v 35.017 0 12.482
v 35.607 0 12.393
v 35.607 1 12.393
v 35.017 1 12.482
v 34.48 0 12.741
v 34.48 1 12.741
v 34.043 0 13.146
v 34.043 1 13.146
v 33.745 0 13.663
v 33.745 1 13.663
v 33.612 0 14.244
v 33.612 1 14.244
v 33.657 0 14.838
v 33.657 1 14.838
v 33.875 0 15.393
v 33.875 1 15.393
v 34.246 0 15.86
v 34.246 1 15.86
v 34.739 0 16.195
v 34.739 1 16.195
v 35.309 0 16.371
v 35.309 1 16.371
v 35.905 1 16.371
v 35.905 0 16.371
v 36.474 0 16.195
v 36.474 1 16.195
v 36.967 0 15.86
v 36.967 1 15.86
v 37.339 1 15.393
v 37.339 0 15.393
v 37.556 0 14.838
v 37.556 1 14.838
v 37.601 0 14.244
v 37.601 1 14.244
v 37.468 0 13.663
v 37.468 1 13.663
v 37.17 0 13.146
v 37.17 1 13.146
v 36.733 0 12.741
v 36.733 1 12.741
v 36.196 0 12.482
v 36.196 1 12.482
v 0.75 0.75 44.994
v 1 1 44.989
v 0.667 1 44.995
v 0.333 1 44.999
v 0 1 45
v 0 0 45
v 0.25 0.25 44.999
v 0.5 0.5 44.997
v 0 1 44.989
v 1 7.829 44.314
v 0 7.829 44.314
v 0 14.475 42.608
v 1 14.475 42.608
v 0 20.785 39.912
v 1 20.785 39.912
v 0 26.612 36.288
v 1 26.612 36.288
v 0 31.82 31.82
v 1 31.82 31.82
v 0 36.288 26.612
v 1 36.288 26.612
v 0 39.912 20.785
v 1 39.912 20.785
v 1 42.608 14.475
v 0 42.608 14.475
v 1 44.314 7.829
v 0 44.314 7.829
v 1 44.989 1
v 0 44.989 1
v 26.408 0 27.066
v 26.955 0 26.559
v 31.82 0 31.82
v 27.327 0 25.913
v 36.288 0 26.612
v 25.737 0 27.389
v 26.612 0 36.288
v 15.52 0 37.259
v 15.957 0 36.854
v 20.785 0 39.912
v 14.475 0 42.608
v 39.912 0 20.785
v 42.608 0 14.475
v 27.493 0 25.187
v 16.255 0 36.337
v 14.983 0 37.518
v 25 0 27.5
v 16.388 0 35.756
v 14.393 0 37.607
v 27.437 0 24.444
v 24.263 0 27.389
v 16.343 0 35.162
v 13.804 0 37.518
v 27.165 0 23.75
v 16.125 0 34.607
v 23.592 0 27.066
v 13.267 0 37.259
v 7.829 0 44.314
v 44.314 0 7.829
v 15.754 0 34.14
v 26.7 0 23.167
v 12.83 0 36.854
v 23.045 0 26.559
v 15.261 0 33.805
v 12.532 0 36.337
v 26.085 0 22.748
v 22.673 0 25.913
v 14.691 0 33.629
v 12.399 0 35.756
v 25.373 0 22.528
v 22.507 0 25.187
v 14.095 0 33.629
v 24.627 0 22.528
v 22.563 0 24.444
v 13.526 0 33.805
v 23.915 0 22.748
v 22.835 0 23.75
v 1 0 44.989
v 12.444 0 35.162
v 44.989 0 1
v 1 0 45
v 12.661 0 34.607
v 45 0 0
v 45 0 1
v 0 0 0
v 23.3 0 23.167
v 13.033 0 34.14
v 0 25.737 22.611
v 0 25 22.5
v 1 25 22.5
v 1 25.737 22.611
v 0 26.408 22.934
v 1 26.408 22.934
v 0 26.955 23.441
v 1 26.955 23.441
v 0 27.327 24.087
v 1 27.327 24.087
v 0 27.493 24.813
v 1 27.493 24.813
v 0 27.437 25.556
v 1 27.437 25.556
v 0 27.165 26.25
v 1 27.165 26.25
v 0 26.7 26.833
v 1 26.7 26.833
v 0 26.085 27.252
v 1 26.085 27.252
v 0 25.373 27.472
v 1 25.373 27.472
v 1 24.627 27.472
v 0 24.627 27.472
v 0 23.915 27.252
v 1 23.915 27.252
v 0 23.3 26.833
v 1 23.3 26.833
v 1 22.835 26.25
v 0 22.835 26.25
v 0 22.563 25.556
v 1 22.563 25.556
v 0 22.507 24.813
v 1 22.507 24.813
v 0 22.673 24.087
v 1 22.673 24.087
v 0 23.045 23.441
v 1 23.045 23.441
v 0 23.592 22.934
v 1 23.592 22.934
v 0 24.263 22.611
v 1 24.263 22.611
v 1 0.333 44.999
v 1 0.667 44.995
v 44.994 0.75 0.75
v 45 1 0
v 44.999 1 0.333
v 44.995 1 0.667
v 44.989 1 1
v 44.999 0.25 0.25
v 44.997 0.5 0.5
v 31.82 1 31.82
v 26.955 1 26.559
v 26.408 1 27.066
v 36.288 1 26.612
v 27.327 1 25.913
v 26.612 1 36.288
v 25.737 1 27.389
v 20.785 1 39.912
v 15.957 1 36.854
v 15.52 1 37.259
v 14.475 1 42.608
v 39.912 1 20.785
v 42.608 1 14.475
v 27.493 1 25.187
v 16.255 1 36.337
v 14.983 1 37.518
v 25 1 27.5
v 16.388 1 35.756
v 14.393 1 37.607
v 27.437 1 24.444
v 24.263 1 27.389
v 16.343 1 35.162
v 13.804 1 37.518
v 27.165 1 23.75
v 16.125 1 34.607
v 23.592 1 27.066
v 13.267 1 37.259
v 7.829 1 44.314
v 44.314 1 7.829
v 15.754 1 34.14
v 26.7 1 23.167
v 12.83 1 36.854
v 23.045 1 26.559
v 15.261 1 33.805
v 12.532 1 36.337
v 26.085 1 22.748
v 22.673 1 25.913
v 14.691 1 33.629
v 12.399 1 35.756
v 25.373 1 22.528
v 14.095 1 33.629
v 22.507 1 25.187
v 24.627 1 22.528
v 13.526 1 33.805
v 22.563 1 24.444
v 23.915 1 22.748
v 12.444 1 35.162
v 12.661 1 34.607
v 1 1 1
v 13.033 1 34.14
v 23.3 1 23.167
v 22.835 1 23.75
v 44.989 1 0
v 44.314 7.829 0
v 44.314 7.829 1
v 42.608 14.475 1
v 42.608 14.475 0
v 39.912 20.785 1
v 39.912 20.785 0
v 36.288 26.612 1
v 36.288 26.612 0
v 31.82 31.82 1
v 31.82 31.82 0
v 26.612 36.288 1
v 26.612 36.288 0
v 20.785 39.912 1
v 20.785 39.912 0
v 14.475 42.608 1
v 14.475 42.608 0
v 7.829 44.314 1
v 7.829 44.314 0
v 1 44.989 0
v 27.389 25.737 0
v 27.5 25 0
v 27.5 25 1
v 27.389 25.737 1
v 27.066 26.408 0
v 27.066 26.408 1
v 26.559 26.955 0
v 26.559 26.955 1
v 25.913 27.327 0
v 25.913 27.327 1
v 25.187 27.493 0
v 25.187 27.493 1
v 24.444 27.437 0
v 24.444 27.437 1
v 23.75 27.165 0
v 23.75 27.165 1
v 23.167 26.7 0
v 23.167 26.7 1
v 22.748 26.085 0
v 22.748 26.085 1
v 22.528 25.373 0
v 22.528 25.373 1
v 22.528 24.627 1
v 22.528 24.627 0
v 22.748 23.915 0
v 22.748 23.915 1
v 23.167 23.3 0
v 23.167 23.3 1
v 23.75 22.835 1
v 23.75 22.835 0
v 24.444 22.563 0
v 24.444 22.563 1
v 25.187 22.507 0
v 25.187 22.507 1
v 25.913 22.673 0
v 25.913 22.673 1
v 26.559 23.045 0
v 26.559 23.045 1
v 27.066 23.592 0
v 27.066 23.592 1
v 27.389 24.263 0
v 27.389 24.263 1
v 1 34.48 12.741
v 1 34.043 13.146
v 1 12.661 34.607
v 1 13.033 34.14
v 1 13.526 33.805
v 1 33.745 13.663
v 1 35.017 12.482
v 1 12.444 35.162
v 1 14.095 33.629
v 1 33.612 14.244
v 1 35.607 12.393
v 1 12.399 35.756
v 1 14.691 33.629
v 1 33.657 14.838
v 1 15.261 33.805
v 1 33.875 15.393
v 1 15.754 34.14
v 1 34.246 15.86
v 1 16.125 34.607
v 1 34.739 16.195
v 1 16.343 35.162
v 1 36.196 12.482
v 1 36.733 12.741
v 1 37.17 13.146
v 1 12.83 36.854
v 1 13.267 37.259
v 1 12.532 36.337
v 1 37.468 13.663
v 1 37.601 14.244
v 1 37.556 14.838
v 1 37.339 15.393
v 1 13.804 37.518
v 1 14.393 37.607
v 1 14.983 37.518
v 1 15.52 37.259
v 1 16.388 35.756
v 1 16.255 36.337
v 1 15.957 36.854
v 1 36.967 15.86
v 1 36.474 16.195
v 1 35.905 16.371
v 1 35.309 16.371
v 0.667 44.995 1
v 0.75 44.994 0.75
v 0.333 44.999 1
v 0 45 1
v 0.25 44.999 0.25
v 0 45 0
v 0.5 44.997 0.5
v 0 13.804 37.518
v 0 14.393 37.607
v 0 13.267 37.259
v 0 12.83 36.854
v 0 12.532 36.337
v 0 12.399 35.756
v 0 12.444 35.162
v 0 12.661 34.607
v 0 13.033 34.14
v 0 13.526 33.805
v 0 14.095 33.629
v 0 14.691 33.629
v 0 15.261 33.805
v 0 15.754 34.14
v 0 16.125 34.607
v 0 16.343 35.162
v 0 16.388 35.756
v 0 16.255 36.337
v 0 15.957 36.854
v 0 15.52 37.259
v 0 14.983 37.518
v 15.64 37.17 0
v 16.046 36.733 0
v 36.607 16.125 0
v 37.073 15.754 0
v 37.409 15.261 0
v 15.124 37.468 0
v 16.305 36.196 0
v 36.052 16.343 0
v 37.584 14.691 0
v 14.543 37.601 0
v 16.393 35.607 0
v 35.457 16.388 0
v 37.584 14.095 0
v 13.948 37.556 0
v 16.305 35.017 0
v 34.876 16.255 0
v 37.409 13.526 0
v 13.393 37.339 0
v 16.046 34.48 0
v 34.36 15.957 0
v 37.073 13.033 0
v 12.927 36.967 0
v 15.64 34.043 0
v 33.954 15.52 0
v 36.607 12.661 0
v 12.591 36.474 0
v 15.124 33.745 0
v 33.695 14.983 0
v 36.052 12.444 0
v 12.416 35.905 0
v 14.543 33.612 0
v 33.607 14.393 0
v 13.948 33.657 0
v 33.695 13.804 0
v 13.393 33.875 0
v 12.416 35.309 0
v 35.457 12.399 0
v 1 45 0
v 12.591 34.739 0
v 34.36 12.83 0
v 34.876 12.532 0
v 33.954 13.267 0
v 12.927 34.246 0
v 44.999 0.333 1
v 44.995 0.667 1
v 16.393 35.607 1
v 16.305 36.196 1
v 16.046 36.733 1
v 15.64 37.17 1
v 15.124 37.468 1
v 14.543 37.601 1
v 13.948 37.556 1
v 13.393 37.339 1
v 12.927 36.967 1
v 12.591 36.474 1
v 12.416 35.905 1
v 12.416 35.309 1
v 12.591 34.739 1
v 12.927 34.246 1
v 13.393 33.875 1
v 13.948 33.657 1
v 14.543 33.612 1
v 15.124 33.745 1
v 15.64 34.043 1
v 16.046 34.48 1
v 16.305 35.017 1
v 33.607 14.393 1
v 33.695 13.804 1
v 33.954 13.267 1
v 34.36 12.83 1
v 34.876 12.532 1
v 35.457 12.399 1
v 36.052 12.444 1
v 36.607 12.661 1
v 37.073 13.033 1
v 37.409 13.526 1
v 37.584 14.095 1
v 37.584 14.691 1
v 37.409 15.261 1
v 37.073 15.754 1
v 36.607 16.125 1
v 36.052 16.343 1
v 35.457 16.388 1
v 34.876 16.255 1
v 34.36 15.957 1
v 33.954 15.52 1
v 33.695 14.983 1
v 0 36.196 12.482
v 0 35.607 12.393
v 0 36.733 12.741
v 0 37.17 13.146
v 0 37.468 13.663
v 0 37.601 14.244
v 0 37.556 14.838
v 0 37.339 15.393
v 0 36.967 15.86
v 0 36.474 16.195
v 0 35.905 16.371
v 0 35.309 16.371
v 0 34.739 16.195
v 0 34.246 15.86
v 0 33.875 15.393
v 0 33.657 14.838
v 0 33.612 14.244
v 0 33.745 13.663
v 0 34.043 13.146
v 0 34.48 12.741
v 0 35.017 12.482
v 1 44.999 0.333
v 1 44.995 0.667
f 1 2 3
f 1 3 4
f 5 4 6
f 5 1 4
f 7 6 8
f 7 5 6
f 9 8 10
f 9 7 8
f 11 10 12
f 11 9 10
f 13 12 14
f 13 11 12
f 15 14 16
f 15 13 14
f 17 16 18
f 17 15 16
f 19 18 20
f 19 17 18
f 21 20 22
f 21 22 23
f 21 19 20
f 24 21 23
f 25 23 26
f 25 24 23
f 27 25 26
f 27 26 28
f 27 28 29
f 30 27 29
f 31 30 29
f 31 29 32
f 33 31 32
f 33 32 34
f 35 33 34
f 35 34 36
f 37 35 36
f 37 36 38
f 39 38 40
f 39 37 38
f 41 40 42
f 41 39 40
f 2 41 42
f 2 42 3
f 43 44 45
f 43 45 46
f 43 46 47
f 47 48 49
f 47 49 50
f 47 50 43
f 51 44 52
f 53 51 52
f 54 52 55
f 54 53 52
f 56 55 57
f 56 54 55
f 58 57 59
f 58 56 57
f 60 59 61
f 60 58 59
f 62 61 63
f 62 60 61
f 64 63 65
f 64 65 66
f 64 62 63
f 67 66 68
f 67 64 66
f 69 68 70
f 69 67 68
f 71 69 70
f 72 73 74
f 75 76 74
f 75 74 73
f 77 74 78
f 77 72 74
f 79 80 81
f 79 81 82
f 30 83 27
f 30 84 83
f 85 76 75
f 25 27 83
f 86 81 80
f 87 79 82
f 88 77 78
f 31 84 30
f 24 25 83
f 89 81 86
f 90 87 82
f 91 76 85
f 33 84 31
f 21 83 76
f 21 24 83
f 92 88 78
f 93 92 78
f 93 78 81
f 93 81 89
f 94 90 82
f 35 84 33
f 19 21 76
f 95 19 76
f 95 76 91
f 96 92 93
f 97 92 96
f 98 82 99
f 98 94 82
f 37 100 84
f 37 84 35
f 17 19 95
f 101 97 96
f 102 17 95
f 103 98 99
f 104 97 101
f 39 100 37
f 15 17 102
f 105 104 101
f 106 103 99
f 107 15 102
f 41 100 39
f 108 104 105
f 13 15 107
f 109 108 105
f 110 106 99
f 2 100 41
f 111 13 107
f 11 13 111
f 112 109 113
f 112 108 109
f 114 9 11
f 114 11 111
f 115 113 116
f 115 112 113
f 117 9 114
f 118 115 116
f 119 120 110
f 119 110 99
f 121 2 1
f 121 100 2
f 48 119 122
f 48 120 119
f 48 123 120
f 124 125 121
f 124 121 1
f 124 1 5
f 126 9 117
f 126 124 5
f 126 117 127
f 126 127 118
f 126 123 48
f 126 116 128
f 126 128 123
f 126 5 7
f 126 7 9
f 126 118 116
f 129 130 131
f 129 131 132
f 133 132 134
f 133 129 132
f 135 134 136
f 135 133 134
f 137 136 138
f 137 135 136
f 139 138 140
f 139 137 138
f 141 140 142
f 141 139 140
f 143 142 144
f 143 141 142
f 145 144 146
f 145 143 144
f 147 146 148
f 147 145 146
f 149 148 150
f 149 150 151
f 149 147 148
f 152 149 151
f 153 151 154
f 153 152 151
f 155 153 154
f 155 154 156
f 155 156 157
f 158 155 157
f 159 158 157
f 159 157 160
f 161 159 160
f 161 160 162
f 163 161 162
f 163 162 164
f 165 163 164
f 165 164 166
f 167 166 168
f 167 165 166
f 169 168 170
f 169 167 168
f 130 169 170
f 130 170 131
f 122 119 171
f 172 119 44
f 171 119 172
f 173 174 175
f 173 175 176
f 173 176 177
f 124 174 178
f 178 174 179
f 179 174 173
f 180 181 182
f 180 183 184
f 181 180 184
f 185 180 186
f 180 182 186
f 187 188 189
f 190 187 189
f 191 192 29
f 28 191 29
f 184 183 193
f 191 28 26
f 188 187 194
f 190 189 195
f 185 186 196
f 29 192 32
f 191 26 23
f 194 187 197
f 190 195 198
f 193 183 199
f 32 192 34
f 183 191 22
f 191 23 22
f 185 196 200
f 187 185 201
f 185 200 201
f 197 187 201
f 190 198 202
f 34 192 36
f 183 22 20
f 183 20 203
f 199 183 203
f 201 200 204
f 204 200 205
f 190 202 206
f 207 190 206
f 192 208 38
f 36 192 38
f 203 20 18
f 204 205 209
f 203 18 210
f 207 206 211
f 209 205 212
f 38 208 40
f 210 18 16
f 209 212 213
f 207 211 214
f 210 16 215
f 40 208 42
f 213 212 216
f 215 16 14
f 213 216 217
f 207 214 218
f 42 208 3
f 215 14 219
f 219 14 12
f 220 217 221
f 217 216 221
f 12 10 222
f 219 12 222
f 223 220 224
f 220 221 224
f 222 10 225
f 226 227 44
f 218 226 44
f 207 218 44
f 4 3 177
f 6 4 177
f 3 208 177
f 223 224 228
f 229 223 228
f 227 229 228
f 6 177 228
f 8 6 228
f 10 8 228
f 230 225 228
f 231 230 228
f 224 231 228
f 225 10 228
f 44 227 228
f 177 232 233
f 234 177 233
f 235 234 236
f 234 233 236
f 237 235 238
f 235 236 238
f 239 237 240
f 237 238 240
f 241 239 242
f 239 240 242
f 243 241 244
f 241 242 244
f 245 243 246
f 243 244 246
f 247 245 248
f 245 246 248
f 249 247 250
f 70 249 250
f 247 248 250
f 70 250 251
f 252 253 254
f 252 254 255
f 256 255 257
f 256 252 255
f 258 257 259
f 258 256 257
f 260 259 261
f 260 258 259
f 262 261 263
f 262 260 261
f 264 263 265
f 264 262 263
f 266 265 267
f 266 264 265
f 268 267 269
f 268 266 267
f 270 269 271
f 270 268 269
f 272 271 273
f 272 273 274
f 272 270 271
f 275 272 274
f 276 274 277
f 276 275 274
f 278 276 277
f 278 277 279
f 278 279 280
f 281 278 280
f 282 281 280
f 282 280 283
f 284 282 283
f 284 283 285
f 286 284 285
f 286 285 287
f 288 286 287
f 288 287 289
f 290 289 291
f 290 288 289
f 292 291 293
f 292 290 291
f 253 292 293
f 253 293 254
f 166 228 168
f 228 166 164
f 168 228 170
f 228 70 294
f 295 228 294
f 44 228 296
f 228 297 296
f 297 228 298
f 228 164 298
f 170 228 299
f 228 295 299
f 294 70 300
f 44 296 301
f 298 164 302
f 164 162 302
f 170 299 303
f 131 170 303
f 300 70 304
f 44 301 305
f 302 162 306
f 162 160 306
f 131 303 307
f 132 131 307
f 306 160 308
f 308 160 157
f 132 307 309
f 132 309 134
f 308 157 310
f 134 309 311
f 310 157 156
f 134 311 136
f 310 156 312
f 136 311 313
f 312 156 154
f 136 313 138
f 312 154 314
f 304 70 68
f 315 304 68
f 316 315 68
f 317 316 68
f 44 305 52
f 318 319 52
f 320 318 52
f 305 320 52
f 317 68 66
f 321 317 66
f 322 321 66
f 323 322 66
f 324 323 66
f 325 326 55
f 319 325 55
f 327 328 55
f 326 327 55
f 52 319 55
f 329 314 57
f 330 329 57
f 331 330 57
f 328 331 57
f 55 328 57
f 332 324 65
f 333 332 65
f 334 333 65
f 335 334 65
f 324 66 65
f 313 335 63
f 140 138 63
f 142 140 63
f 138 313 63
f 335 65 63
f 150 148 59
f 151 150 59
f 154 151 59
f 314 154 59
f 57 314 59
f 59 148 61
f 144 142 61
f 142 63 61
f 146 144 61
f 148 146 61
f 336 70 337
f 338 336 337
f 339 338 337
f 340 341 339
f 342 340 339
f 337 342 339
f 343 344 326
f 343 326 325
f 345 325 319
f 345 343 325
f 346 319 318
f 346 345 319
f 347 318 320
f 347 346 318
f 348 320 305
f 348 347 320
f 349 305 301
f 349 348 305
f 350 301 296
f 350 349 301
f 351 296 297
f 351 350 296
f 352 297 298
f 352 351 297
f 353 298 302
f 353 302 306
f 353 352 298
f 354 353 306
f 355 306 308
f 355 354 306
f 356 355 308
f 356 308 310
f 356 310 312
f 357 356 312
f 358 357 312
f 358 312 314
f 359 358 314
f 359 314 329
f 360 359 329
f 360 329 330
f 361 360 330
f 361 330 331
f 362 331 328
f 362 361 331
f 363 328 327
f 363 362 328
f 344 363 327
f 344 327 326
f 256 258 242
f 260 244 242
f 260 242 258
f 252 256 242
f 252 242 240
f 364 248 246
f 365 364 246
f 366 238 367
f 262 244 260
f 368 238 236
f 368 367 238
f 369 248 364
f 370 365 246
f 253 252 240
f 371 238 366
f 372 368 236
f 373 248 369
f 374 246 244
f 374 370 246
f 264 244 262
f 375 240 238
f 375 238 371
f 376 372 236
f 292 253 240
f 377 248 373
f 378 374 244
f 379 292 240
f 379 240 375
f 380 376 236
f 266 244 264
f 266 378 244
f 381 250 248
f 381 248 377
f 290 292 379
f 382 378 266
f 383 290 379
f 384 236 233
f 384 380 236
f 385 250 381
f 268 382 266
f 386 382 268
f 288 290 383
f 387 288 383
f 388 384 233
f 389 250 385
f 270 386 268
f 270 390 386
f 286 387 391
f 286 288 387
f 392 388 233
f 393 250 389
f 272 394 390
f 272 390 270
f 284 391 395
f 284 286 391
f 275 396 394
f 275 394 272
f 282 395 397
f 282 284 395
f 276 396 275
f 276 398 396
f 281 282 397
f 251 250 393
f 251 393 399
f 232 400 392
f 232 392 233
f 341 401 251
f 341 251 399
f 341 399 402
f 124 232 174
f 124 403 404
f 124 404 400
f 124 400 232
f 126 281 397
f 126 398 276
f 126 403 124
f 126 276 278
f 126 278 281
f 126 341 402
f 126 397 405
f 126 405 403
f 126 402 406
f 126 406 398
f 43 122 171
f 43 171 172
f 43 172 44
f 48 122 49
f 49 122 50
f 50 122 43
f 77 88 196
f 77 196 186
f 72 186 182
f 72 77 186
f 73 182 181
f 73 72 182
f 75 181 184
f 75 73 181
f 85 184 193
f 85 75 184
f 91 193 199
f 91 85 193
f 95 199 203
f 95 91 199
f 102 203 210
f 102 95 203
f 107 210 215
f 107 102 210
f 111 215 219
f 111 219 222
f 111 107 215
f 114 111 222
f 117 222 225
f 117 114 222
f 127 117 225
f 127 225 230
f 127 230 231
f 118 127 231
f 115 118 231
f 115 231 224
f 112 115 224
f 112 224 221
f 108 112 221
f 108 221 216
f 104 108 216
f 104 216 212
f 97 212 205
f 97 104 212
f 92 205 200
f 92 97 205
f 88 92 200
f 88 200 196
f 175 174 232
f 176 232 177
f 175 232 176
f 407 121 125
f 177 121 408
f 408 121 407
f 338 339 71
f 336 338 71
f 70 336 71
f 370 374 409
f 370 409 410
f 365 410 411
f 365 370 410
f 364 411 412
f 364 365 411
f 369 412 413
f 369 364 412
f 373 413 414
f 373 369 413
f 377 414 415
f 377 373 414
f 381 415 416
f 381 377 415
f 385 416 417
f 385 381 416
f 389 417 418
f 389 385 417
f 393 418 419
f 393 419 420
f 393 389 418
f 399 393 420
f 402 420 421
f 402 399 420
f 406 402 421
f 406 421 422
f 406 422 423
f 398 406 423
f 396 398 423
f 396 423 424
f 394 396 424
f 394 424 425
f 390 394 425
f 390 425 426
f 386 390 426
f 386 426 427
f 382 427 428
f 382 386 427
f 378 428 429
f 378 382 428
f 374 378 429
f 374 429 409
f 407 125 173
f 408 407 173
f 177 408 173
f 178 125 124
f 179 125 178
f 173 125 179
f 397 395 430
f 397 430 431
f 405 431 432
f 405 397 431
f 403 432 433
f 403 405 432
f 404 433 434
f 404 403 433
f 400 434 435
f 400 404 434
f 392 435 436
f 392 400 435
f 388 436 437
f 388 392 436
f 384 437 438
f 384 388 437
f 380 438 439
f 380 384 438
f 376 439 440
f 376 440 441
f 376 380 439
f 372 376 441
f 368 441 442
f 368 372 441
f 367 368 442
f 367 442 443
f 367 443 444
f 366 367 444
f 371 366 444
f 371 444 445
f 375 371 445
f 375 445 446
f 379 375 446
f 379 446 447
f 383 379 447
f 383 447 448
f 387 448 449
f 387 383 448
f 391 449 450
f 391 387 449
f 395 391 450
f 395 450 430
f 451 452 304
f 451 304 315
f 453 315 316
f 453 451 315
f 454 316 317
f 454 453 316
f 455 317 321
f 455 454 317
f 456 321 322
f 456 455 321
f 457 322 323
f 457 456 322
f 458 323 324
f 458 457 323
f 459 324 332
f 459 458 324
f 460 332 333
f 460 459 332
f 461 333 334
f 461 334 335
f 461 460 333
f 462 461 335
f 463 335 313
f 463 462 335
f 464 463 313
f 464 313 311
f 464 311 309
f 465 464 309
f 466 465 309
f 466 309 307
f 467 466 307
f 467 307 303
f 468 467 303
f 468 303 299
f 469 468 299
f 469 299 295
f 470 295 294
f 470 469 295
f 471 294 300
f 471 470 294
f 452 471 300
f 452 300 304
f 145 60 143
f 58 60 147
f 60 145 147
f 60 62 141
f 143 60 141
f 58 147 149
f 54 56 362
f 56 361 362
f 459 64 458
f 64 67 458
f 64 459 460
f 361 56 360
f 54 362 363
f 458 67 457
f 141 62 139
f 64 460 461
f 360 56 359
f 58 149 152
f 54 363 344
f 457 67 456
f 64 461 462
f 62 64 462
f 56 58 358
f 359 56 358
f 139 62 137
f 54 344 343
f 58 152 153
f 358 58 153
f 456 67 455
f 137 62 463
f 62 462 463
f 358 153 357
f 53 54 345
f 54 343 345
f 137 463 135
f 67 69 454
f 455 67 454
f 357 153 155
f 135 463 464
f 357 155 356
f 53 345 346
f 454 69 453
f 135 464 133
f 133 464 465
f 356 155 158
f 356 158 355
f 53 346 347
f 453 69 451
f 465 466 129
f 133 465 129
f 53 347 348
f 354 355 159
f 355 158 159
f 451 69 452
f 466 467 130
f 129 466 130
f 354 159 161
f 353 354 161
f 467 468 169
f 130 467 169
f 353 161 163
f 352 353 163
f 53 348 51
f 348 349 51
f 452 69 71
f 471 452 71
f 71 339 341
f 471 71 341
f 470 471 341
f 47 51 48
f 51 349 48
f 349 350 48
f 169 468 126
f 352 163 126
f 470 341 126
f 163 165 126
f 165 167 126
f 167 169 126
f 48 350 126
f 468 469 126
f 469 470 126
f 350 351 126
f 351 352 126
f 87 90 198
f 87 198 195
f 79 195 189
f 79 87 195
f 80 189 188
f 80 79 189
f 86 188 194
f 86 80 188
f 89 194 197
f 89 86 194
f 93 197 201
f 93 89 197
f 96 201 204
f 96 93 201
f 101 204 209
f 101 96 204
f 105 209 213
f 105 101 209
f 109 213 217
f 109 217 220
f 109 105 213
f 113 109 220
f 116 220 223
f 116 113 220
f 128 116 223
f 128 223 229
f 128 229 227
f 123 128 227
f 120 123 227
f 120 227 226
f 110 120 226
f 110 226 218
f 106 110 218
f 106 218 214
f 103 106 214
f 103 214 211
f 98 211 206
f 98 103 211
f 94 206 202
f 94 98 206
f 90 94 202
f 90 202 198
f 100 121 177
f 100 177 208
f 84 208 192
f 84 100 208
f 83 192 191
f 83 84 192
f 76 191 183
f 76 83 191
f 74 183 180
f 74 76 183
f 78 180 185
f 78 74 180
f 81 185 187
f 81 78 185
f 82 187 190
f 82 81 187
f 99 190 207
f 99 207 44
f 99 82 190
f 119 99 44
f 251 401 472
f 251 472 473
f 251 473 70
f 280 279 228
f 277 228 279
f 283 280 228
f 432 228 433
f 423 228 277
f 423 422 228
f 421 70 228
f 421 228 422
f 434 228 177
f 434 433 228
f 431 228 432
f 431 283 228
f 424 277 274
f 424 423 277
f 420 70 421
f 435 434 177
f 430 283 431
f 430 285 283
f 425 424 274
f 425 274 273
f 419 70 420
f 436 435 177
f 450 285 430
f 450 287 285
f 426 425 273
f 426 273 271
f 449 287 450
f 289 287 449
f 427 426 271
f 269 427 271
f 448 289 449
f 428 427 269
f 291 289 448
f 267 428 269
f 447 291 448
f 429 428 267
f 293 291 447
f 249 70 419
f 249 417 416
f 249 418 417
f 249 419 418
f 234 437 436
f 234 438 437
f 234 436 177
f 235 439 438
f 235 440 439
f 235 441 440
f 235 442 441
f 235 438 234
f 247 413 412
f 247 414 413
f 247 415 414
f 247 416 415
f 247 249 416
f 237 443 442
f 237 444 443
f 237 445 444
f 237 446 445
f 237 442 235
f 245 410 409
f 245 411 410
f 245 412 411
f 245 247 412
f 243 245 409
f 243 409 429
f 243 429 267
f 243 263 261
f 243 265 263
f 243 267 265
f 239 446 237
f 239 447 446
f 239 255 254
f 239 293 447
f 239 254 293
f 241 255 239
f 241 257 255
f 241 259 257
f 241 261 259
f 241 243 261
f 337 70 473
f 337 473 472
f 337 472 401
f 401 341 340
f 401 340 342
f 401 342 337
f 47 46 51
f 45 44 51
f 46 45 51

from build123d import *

# Parameters (mm, degrees)
SKETCH_2_R      = 2.5
SKETCH_2_R_2    = 2
EXTRUDE_1_DEPTH = 1
SKETCH_3_R      = 2.5
SKETCH_3_R_2    = 2
EXTRUDE_2_DEPTH = 1
SKETCH_5_R      = 2.5
SKETCH_5_R_2    = 2
EXTRUDE_3_DEPTH = 1


with BuildPart() as part:
    # Эскиз2 → Бобышка-Вытянуть1 (new body)
    with BuildSketch(Plane(origin=(0, 0, 0), x_dir=(1, 0, 0), z_dir=(0, 1, 0))):
        with BuildLine():
            Line((0, -45), (0, 0))
            Line((0, 0), (45, 0))
            ThreePointArc((45, 0), (31.819805153, -31.819805153), (0, -45))
        make_face()
        with Locations(Location((25, -25, 0), (0, 0, 270))):
            Circle(SKETCH_2_R, mode=Mode.SUBTRACT)
        with Locations(Location((14.393398282, -35.606601718, 0), (0, 0, 270))):
            Circle(SKETCH_2_R_2, mode=Mode.SUBTRACT)
        with Locations(Location((35.606601718, -14.393398282, 0), (0, 0, 90))):
            Circle(SKETCH_2_R_2, mode=Mode.SUBTRACT)
    extrude(amount=EXTRUDE_1_DEPTH)

    # Эскиз3 → Бобышка-Вытянуть2 (add)
    with BuildSketch(Plane.XY):
        with BuildLine():
            Line((0, 45), (0, 0))
            Line((0, 0), (45, 0))
            ThreePointArc((45, 0), (31.819805153, 31.819805153), (0, 45))
        make_face()
        with Locations((25, 25)):
            Circle(SKETCH_3_R, mode=Mode.SUBTRACT)
        with Locations((14.393398282, 35.606601718)):
            Circle(SKETCH_3_R_2, mode=Mode.SUBTRACT)
        with Locations(Location((35.606601718, 14.393398282, 0), (0, 0, 180))):
            Circle(SKETCH_3_R_2, mode=Mode.SUBTRACT)
    extrude(amount=EXTRUDE_2_DEPTH)

    # Эскиз5 → Бобышка-Вытянуть3 (add)
    with BuildSketch(Plane(origin=(0, 0, 0), x_dir=(0, 0, -1), z_dir=(1, 0, 0))):
        with BuildLine():
            Line((0, 45), (0, 0))
            Line((0, 0), (-45, 0))
            ThreePointArc((-45, 0), (-31.819805153, 31.819805153), (0, 45))
        make_face()
        with Locations((-25, 25)):
            Circle(SKETCH_5_R, mode=Mode.SUBTRACT)
        with Locations((-14.393398282, 35.606601718)):
            Circle(SKETCH_5_R_2, mode=Mode.SUBTRACT)
        with Locations(Location((-35.606601718, 14.393398282, 0), (0, 0, 180))):
            Circle(SKETCH_5_R_2, mode=Mode.SUBTRACT)
    extrude(amount=EXTRUDE_3_DEPTH)


solid = part.part
